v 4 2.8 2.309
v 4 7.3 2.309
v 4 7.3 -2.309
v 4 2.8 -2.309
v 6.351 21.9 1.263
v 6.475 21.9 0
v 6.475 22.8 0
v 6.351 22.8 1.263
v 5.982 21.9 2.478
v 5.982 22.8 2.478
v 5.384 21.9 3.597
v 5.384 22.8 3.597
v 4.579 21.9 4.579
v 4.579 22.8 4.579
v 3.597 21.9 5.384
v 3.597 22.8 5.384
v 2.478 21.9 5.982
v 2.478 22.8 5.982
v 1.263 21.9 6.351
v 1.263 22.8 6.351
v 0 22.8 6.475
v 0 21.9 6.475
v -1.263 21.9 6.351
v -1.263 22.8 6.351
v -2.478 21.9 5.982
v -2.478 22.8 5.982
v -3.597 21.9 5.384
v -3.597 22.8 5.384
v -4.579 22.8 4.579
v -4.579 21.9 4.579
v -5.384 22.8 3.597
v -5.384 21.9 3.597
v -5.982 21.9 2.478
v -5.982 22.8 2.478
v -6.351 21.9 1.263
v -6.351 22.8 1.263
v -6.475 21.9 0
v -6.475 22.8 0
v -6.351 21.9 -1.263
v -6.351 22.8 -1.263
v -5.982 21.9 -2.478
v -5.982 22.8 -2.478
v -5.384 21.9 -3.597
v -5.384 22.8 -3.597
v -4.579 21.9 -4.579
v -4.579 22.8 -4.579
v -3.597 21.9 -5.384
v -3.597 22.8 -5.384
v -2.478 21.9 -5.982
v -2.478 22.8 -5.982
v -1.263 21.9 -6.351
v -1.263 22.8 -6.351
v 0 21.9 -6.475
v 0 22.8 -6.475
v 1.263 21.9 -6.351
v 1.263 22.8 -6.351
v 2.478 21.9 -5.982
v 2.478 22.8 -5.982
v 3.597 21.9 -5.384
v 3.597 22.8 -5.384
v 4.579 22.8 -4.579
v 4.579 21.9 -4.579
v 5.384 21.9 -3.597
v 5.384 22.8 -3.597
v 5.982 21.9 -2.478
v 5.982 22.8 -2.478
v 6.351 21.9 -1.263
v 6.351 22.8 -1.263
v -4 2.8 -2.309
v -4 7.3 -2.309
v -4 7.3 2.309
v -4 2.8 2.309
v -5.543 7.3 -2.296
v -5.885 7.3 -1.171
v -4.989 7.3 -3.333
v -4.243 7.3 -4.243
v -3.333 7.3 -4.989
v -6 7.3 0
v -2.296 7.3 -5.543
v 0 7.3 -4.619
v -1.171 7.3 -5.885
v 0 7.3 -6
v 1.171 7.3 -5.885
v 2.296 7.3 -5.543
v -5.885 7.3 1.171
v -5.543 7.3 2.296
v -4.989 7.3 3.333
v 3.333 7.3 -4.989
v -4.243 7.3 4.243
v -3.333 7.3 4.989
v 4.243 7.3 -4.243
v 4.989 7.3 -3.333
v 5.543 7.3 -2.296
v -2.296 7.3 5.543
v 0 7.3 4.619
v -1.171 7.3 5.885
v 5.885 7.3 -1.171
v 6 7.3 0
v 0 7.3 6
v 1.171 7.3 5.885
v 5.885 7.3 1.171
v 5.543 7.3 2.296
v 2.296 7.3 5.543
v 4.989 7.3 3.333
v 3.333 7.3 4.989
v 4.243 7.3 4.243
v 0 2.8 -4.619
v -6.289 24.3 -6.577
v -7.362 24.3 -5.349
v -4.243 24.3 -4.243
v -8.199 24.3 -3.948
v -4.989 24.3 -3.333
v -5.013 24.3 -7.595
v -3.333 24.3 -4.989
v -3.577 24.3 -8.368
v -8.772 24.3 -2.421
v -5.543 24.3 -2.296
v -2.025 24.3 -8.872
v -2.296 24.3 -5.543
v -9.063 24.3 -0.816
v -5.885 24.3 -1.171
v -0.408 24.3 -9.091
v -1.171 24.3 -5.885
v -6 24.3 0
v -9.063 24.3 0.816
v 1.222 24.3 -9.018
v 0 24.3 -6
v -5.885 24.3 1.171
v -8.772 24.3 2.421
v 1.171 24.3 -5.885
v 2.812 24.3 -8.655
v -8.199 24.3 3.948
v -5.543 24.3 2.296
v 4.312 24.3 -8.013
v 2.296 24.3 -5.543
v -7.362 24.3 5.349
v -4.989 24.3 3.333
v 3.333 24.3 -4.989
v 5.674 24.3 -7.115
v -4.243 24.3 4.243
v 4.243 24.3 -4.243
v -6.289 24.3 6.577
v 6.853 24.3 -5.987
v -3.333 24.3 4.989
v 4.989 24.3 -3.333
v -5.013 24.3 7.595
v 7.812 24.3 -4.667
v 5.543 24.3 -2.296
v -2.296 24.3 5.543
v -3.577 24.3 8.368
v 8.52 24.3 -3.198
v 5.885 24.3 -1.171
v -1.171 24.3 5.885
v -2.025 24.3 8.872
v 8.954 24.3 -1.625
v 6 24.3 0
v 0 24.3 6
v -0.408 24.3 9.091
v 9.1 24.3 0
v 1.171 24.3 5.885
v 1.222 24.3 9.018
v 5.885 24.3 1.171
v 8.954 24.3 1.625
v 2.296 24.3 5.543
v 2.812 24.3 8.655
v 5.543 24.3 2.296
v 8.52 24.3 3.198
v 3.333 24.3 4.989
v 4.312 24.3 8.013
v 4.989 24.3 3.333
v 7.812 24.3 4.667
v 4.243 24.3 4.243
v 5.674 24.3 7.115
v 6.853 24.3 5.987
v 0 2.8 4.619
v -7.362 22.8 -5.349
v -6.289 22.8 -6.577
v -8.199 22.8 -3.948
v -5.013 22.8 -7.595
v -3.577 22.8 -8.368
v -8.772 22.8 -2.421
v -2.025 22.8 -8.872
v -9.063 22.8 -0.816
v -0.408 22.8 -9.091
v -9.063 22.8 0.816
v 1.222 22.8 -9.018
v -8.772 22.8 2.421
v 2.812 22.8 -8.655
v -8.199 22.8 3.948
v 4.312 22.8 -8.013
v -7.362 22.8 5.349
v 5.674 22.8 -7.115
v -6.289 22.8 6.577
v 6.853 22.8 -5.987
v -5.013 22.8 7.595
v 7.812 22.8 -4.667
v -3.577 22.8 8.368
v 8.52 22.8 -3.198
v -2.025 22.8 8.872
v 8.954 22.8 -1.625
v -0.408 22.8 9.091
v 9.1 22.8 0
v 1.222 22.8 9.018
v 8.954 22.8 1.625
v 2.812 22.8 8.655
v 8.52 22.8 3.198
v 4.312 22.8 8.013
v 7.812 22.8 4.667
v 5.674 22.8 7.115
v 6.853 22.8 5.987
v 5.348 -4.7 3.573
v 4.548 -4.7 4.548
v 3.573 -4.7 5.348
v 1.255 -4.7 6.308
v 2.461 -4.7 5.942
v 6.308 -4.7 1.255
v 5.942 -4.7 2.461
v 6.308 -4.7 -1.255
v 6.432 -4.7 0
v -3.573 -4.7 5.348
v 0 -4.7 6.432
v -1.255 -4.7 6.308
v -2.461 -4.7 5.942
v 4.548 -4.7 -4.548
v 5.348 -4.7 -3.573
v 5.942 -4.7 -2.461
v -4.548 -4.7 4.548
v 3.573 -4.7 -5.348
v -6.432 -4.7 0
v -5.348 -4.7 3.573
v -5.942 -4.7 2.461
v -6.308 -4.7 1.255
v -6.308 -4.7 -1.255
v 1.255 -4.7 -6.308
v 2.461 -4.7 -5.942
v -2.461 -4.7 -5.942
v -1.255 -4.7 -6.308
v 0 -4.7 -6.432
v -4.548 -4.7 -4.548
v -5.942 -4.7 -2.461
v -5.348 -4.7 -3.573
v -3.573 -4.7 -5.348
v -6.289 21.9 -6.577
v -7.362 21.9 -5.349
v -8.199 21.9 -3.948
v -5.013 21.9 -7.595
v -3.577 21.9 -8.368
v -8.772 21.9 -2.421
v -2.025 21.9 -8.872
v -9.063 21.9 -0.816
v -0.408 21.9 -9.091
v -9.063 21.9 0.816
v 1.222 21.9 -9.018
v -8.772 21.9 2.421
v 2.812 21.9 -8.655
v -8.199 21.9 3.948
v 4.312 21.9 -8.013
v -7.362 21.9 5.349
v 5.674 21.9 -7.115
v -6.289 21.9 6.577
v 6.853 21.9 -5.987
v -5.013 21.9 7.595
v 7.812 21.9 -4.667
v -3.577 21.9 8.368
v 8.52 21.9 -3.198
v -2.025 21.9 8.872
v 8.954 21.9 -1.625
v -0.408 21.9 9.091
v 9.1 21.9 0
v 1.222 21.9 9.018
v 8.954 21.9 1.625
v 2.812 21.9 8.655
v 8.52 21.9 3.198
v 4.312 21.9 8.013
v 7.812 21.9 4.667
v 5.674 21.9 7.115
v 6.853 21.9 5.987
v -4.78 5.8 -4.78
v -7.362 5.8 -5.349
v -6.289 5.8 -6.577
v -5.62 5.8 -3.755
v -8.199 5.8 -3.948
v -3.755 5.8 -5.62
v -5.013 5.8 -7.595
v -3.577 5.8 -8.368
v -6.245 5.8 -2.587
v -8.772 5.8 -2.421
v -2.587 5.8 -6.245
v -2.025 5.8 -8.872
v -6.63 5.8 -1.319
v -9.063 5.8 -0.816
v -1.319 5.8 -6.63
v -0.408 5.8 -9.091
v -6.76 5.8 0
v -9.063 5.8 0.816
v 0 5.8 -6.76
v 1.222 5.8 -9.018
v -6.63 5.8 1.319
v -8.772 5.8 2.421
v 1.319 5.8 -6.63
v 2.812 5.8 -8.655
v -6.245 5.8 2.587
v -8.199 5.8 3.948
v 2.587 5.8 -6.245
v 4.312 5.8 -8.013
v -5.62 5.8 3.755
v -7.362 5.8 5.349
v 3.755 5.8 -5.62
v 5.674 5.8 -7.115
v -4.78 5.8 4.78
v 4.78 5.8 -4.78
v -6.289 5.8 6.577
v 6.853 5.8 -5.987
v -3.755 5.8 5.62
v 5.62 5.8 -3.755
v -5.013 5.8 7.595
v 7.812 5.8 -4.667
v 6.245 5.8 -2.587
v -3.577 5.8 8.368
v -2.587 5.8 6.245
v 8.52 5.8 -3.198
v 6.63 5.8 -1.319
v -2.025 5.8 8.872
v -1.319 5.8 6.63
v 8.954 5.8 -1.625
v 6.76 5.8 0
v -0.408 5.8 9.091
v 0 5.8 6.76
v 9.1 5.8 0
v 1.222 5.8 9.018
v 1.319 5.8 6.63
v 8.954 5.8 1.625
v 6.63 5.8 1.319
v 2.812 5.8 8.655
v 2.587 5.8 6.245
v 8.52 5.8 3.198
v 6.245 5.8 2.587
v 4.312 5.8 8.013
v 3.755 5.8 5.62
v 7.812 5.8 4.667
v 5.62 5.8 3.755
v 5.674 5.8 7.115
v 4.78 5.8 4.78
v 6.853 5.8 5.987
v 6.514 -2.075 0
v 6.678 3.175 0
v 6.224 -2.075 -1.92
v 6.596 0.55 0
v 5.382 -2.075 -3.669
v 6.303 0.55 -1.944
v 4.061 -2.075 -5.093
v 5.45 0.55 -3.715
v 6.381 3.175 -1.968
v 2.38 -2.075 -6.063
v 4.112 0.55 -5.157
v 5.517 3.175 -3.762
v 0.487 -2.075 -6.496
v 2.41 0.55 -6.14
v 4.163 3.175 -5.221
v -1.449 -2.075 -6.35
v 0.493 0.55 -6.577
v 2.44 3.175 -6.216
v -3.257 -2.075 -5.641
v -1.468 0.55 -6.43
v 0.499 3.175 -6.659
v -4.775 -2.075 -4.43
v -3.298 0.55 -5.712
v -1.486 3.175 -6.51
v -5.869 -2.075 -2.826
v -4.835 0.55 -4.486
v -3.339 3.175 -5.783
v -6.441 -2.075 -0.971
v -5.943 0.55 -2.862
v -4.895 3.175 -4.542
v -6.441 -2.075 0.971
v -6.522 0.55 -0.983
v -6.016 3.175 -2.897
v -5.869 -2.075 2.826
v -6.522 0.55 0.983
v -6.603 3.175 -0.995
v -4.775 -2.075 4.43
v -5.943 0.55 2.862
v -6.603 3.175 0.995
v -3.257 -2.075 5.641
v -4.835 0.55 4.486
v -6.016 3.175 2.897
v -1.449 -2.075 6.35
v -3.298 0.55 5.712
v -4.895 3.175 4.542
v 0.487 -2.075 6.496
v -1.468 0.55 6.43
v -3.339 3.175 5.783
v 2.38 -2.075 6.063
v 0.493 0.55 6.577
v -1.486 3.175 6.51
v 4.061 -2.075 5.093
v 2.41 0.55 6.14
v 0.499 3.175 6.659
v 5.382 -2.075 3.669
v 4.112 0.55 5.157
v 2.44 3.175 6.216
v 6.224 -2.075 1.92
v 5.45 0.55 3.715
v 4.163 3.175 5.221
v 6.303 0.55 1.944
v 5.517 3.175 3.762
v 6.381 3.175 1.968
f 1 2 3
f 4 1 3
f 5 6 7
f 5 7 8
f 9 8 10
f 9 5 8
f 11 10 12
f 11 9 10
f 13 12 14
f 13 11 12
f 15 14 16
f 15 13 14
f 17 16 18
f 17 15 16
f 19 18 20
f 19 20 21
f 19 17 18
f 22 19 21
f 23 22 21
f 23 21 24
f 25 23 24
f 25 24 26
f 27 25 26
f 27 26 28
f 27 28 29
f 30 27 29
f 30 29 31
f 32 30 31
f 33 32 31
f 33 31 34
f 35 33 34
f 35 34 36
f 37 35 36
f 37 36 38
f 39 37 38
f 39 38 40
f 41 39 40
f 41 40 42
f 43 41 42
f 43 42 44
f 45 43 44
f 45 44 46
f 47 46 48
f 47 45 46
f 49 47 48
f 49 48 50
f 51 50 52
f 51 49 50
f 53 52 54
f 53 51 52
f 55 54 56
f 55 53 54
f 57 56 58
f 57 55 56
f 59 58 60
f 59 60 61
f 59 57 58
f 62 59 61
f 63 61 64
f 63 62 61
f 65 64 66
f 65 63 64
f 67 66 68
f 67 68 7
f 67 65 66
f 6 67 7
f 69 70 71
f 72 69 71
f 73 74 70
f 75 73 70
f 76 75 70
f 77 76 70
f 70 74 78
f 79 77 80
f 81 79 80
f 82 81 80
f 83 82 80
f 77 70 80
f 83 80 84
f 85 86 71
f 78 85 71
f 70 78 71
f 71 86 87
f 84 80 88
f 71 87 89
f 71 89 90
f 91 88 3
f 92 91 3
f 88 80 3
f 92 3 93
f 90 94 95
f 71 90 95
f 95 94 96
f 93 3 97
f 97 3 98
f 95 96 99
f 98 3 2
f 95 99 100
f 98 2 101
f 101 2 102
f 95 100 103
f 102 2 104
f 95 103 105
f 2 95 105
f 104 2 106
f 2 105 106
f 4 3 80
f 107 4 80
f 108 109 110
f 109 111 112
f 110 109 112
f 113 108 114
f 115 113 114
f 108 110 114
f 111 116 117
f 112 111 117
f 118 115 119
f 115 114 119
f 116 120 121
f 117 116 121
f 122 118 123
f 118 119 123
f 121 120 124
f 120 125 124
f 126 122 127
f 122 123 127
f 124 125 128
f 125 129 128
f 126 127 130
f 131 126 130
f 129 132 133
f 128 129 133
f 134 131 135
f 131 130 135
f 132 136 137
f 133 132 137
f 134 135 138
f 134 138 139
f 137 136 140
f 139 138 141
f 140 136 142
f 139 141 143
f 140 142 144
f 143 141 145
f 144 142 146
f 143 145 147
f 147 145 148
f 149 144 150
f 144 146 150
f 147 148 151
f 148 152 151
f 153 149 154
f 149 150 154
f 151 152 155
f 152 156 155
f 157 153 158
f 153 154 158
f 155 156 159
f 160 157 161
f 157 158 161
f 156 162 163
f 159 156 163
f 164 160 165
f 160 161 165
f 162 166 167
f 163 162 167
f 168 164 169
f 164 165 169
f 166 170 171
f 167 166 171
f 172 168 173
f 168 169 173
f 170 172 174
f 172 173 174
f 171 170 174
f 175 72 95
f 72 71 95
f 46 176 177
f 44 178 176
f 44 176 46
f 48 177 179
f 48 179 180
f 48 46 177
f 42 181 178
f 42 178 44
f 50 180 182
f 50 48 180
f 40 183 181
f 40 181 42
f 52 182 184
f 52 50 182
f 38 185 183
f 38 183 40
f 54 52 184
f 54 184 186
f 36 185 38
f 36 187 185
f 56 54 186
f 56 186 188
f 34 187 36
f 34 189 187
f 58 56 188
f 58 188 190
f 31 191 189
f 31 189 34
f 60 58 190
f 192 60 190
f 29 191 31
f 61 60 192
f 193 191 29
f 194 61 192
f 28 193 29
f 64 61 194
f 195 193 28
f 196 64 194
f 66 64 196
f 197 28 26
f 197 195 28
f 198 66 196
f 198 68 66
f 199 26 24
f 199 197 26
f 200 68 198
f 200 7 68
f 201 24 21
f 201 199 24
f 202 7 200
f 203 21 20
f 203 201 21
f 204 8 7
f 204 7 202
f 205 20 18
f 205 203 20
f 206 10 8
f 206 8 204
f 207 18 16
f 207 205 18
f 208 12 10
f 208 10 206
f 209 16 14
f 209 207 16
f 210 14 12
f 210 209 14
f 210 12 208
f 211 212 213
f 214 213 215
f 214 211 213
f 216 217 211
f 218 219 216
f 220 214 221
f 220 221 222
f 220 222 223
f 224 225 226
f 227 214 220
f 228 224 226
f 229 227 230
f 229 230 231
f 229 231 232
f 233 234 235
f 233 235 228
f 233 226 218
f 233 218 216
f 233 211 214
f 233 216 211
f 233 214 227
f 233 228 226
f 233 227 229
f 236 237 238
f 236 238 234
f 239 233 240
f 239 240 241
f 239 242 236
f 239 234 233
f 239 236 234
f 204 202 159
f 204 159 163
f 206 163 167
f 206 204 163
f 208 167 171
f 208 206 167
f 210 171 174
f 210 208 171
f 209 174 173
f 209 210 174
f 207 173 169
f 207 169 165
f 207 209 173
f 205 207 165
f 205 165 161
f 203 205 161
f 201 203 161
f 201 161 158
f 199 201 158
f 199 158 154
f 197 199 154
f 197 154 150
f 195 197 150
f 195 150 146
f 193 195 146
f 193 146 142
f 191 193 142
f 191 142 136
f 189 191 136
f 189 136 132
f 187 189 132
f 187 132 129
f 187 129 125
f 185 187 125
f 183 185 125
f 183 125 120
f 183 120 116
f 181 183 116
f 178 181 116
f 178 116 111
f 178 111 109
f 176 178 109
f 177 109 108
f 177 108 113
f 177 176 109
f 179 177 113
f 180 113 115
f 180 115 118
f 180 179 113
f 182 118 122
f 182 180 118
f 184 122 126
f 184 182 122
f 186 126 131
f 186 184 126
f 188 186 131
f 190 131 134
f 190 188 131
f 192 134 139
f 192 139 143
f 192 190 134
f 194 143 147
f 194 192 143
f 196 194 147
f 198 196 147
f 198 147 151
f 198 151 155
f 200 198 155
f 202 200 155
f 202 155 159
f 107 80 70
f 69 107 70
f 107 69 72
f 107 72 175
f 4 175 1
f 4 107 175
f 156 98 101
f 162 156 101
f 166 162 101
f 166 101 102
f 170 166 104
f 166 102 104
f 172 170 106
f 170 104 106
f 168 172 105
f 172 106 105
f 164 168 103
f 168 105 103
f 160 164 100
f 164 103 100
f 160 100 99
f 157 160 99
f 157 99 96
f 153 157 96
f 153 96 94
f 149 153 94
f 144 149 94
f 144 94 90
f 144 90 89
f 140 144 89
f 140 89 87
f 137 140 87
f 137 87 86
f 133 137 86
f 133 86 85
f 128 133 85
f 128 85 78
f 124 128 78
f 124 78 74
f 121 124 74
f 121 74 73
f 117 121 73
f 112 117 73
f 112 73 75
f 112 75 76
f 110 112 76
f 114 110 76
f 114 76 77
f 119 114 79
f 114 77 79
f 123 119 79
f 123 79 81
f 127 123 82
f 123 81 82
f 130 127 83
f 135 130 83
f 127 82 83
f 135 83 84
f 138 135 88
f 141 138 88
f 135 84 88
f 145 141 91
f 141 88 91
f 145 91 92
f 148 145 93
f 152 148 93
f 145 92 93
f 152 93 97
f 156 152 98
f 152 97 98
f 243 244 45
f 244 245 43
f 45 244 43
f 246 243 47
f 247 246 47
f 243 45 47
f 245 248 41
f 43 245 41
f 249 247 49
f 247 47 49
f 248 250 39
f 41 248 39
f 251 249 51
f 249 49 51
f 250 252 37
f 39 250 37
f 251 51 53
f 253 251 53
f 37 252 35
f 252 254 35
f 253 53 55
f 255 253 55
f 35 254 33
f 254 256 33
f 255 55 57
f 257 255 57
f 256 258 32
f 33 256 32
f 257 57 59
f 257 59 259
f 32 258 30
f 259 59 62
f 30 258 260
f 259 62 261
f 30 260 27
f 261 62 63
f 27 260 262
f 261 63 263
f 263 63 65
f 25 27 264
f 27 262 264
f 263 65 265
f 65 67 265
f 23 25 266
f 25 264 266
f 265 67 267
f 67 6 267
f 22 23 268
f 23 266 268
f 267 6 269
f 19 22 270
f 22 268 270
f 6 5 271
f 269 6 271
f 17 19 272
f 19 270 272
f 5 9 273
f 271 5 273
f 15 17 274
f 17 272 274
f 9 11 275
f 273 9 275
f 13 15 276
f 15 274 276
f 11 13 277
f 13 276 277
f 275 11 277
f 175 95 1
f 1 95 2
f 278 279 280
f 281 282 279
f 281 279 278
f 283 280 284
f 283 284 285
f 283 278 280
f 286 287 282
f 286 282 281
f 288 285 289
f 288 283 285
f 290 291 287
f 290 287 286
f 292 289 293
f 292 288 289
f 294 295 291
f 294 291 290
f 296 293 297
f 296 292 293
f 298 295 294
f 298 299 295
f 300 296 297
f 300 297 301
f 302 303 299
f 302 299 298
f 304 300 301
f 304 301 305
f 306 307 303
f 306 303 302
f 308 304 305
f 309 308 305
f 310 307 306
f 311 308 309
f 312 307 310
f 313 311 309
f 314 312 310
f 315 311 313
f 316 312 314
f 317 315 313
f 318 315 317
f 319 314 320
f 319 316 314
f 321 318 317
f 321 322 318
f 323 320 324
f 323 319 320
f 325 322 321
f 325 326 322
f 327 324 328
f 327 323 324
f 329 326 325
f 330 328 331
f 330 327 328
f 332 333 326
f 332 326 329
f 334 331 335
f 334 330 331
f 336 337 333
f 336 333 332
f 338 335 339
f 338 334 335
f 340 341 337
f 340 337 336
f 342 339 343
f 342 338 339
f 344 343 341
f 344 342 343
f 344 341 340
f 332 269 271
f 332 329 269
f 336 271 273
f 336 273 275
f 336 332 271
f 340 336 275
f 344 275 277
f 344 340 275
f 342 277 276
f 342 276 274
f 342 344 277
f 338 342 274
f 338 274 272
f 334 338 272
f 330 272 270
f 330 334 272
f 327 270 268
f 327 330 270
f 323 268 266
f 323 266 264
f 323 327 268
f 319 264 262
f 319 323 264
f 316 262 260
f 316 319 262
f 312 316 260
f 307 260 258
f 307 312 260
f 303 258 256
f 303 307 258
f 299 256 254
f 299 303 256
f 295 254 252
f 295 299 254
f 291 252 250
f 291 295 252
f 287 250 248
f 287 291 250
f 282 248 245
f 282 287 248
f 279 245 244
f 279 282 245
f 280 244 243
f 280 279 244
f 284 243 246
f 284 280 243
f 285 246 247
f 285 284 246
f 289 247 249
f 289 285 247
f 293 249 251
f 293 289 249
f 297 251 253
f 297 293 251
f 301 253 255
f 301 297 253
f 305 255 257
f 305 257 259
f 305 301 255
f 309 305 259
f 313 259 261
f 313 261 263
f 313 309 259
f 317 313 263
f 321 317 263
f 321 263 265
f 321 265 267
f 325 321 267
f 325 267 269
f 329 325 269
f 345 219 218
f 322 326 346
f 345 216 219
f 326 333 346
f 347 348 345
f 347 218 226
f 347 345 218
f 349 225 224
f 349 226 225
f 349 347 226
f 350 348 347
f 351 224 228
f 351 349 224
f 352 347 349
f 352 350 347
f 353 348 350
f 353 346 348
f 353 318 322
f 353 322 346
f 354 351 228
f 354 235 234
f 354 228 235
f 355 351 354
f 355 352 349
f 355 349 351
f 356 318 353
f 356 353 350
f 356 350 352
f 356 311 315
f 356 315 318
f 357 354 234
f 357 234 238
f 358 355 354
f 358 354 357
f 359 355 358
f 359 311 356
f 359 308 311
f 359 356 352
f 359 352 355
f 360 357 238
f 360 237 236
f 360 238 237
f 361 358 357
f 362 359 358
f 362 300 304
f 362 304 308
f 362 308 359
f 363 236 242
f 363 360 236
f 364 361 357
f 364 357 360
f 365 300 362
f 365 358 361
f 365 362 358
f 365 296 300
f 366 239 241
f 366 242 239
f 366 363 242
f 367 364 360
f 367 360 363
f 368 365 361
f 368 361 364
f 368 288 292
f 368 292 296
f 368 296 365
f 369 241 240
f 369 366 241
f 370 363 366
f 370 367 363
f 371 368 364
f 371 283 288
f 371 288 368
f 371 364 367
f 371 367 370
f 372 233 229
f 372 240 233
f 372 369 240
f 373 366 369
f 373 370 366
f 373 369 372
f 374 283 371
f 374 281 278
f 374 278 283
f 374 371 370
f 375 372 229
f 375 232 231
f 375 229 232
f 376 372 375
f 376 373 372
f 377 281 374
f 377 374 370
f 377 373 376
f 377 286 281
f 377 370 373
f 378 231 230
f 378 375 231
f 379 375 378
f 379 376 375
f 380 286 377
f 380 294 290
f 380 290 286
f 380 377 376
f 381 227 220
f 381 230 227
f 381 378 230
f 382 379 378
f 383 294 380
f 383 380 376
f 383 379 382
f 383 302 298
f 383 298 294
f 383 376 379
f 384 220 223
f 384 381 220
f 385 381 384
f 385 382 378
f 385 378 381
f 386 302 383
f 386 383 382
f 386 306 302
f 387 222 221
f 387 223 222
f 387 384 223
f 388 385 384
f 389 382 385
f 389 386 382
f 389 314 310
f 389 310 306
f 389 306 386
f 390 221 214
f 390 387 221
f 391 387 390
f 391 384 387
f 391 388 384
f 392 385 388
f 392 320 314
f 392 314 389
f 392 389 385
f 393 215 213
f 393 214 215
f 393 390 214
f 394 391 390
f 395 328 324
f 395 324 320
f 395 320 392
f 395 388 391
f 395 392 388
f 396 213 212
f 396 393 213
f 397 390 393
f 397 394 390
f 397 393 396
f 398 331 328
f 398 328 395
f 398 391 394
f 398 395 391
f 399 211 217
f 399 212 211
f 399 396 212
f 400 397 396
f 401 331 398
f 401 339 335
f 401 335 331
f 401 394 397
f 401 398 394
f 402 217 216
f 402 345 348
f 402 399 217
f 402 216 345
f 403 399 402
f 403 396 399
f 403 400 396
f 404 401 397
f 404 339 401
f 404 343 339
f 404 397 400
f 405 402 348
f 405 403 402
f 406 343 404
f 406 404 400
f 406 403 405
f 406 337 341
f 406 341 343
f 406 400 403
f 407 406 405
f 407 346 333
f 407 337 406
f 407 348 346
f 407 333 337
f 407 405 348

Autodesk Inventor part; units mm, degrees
sketch "Sketch_1" plane through (0, 0, 0) normal (0, 0, 1) x (1, 0, 0)
  line L0 (0, -6.01) -> (0, 24.3)
  line L1 (0, 24.3) -> (9.1, 24.3)
  line L2 (9.1, 24.3) -> (9.1, 22.8)
  line L3 (9.1, 22.8) -> (6.475, 22.8)
  line L4 (6.475, 22.8) -> (6.475, 21.9)
  line L5 (6.475, 21.9) -> (9.1, 21.9)
  line L6 (9.1, 21.9) -> (9.1, 5.8)
  line L7 (9.1, 5.8) -> (6.7596, 5.8)
  line L8 (6.7596, 5.8) -> (6.3909, -6.01)
  line L9 (6.3909, -6.01) -> (0, -6.01)
  line L10 (0, -6.01) -> (0, 24.3)
revolve "Revolution1" add sketch "Sketch_1" angle 360 about axis through (0, -6.01, 0) along (0, -1, 0)
thread "Thread1" size "R 1/4" standard "ISO Taper" full length
sketch "_____1" plane through (0, 0, 0) normal (0, 0, 1) x (1, 0, 0)
  line L0 (-13.157, -4.7) -> (-13.157, -6.01)
  line L1 (-13.157, -6.01) -> (13.157, -6.01)
  line L2 (13.157, -6.01) -> (13.157, -4.7)
  line L3 (13.157, -4.7) -> (-13.157, -4.7)
extrude "Extrusion1" cut sketch "_____1" along normal mid plane 26.314
sketch "Sketch_2" plane through (0, 0, 0) normal (0, 0, 1) x (1, 0, 0)
  line L0 (0, 7.3) -> (0, 24.3)
  line L1 (0, 24.3) -> (6, 24.3)
  line L2 (6, 24.3) -> (6, 7.3)
  line L3 (6, 7.3) -> (0, 7.3)
  line L4 (0, 7.3) -> (0, 24.3)
revolve "Revolution2" cut sketch "Sketch_2" angle 360 about axis through (0, 7.3, 0) along (0, -1, 0)
sketch "Sketch_3" plane through (0, 24.3, 0) normal (0, 1, 0) x (1, 0, 0)
  line L0 (-4, -2.3094) -> (0, -4.6188)
  line L1 (0, -4.6188) -> (4, -2.3094)
  line L2 (4, -2.3094) -> (4, 2.3094)
  line L3 (4, 2.3094) -> (0, 4.6188)
  line L4 (0, 4.6188) -> (-4, 2.3094)
  line L5 (-4, 2.3094) -> (-4, -2.3094)
extrude "Extrusion2" cut sketch "Sketch_3" against normal blind 21.5
ref_plane "CNS_SCREW_XY" through (0, 0, 0) normal (0, 1, 0) x (1, 0, 0)
ref_plane "CNS_SCREW_YZ" through (0, 0, 0) normal (1, 0, 0) x (0, 0, -1)
ref_plane "CNS_SCREW_ZX" through (0, 0, 0) normal (0, 0, -1) x (0, 1, 0)
properties part number "KQ2S12-02AS (A) Brass"
